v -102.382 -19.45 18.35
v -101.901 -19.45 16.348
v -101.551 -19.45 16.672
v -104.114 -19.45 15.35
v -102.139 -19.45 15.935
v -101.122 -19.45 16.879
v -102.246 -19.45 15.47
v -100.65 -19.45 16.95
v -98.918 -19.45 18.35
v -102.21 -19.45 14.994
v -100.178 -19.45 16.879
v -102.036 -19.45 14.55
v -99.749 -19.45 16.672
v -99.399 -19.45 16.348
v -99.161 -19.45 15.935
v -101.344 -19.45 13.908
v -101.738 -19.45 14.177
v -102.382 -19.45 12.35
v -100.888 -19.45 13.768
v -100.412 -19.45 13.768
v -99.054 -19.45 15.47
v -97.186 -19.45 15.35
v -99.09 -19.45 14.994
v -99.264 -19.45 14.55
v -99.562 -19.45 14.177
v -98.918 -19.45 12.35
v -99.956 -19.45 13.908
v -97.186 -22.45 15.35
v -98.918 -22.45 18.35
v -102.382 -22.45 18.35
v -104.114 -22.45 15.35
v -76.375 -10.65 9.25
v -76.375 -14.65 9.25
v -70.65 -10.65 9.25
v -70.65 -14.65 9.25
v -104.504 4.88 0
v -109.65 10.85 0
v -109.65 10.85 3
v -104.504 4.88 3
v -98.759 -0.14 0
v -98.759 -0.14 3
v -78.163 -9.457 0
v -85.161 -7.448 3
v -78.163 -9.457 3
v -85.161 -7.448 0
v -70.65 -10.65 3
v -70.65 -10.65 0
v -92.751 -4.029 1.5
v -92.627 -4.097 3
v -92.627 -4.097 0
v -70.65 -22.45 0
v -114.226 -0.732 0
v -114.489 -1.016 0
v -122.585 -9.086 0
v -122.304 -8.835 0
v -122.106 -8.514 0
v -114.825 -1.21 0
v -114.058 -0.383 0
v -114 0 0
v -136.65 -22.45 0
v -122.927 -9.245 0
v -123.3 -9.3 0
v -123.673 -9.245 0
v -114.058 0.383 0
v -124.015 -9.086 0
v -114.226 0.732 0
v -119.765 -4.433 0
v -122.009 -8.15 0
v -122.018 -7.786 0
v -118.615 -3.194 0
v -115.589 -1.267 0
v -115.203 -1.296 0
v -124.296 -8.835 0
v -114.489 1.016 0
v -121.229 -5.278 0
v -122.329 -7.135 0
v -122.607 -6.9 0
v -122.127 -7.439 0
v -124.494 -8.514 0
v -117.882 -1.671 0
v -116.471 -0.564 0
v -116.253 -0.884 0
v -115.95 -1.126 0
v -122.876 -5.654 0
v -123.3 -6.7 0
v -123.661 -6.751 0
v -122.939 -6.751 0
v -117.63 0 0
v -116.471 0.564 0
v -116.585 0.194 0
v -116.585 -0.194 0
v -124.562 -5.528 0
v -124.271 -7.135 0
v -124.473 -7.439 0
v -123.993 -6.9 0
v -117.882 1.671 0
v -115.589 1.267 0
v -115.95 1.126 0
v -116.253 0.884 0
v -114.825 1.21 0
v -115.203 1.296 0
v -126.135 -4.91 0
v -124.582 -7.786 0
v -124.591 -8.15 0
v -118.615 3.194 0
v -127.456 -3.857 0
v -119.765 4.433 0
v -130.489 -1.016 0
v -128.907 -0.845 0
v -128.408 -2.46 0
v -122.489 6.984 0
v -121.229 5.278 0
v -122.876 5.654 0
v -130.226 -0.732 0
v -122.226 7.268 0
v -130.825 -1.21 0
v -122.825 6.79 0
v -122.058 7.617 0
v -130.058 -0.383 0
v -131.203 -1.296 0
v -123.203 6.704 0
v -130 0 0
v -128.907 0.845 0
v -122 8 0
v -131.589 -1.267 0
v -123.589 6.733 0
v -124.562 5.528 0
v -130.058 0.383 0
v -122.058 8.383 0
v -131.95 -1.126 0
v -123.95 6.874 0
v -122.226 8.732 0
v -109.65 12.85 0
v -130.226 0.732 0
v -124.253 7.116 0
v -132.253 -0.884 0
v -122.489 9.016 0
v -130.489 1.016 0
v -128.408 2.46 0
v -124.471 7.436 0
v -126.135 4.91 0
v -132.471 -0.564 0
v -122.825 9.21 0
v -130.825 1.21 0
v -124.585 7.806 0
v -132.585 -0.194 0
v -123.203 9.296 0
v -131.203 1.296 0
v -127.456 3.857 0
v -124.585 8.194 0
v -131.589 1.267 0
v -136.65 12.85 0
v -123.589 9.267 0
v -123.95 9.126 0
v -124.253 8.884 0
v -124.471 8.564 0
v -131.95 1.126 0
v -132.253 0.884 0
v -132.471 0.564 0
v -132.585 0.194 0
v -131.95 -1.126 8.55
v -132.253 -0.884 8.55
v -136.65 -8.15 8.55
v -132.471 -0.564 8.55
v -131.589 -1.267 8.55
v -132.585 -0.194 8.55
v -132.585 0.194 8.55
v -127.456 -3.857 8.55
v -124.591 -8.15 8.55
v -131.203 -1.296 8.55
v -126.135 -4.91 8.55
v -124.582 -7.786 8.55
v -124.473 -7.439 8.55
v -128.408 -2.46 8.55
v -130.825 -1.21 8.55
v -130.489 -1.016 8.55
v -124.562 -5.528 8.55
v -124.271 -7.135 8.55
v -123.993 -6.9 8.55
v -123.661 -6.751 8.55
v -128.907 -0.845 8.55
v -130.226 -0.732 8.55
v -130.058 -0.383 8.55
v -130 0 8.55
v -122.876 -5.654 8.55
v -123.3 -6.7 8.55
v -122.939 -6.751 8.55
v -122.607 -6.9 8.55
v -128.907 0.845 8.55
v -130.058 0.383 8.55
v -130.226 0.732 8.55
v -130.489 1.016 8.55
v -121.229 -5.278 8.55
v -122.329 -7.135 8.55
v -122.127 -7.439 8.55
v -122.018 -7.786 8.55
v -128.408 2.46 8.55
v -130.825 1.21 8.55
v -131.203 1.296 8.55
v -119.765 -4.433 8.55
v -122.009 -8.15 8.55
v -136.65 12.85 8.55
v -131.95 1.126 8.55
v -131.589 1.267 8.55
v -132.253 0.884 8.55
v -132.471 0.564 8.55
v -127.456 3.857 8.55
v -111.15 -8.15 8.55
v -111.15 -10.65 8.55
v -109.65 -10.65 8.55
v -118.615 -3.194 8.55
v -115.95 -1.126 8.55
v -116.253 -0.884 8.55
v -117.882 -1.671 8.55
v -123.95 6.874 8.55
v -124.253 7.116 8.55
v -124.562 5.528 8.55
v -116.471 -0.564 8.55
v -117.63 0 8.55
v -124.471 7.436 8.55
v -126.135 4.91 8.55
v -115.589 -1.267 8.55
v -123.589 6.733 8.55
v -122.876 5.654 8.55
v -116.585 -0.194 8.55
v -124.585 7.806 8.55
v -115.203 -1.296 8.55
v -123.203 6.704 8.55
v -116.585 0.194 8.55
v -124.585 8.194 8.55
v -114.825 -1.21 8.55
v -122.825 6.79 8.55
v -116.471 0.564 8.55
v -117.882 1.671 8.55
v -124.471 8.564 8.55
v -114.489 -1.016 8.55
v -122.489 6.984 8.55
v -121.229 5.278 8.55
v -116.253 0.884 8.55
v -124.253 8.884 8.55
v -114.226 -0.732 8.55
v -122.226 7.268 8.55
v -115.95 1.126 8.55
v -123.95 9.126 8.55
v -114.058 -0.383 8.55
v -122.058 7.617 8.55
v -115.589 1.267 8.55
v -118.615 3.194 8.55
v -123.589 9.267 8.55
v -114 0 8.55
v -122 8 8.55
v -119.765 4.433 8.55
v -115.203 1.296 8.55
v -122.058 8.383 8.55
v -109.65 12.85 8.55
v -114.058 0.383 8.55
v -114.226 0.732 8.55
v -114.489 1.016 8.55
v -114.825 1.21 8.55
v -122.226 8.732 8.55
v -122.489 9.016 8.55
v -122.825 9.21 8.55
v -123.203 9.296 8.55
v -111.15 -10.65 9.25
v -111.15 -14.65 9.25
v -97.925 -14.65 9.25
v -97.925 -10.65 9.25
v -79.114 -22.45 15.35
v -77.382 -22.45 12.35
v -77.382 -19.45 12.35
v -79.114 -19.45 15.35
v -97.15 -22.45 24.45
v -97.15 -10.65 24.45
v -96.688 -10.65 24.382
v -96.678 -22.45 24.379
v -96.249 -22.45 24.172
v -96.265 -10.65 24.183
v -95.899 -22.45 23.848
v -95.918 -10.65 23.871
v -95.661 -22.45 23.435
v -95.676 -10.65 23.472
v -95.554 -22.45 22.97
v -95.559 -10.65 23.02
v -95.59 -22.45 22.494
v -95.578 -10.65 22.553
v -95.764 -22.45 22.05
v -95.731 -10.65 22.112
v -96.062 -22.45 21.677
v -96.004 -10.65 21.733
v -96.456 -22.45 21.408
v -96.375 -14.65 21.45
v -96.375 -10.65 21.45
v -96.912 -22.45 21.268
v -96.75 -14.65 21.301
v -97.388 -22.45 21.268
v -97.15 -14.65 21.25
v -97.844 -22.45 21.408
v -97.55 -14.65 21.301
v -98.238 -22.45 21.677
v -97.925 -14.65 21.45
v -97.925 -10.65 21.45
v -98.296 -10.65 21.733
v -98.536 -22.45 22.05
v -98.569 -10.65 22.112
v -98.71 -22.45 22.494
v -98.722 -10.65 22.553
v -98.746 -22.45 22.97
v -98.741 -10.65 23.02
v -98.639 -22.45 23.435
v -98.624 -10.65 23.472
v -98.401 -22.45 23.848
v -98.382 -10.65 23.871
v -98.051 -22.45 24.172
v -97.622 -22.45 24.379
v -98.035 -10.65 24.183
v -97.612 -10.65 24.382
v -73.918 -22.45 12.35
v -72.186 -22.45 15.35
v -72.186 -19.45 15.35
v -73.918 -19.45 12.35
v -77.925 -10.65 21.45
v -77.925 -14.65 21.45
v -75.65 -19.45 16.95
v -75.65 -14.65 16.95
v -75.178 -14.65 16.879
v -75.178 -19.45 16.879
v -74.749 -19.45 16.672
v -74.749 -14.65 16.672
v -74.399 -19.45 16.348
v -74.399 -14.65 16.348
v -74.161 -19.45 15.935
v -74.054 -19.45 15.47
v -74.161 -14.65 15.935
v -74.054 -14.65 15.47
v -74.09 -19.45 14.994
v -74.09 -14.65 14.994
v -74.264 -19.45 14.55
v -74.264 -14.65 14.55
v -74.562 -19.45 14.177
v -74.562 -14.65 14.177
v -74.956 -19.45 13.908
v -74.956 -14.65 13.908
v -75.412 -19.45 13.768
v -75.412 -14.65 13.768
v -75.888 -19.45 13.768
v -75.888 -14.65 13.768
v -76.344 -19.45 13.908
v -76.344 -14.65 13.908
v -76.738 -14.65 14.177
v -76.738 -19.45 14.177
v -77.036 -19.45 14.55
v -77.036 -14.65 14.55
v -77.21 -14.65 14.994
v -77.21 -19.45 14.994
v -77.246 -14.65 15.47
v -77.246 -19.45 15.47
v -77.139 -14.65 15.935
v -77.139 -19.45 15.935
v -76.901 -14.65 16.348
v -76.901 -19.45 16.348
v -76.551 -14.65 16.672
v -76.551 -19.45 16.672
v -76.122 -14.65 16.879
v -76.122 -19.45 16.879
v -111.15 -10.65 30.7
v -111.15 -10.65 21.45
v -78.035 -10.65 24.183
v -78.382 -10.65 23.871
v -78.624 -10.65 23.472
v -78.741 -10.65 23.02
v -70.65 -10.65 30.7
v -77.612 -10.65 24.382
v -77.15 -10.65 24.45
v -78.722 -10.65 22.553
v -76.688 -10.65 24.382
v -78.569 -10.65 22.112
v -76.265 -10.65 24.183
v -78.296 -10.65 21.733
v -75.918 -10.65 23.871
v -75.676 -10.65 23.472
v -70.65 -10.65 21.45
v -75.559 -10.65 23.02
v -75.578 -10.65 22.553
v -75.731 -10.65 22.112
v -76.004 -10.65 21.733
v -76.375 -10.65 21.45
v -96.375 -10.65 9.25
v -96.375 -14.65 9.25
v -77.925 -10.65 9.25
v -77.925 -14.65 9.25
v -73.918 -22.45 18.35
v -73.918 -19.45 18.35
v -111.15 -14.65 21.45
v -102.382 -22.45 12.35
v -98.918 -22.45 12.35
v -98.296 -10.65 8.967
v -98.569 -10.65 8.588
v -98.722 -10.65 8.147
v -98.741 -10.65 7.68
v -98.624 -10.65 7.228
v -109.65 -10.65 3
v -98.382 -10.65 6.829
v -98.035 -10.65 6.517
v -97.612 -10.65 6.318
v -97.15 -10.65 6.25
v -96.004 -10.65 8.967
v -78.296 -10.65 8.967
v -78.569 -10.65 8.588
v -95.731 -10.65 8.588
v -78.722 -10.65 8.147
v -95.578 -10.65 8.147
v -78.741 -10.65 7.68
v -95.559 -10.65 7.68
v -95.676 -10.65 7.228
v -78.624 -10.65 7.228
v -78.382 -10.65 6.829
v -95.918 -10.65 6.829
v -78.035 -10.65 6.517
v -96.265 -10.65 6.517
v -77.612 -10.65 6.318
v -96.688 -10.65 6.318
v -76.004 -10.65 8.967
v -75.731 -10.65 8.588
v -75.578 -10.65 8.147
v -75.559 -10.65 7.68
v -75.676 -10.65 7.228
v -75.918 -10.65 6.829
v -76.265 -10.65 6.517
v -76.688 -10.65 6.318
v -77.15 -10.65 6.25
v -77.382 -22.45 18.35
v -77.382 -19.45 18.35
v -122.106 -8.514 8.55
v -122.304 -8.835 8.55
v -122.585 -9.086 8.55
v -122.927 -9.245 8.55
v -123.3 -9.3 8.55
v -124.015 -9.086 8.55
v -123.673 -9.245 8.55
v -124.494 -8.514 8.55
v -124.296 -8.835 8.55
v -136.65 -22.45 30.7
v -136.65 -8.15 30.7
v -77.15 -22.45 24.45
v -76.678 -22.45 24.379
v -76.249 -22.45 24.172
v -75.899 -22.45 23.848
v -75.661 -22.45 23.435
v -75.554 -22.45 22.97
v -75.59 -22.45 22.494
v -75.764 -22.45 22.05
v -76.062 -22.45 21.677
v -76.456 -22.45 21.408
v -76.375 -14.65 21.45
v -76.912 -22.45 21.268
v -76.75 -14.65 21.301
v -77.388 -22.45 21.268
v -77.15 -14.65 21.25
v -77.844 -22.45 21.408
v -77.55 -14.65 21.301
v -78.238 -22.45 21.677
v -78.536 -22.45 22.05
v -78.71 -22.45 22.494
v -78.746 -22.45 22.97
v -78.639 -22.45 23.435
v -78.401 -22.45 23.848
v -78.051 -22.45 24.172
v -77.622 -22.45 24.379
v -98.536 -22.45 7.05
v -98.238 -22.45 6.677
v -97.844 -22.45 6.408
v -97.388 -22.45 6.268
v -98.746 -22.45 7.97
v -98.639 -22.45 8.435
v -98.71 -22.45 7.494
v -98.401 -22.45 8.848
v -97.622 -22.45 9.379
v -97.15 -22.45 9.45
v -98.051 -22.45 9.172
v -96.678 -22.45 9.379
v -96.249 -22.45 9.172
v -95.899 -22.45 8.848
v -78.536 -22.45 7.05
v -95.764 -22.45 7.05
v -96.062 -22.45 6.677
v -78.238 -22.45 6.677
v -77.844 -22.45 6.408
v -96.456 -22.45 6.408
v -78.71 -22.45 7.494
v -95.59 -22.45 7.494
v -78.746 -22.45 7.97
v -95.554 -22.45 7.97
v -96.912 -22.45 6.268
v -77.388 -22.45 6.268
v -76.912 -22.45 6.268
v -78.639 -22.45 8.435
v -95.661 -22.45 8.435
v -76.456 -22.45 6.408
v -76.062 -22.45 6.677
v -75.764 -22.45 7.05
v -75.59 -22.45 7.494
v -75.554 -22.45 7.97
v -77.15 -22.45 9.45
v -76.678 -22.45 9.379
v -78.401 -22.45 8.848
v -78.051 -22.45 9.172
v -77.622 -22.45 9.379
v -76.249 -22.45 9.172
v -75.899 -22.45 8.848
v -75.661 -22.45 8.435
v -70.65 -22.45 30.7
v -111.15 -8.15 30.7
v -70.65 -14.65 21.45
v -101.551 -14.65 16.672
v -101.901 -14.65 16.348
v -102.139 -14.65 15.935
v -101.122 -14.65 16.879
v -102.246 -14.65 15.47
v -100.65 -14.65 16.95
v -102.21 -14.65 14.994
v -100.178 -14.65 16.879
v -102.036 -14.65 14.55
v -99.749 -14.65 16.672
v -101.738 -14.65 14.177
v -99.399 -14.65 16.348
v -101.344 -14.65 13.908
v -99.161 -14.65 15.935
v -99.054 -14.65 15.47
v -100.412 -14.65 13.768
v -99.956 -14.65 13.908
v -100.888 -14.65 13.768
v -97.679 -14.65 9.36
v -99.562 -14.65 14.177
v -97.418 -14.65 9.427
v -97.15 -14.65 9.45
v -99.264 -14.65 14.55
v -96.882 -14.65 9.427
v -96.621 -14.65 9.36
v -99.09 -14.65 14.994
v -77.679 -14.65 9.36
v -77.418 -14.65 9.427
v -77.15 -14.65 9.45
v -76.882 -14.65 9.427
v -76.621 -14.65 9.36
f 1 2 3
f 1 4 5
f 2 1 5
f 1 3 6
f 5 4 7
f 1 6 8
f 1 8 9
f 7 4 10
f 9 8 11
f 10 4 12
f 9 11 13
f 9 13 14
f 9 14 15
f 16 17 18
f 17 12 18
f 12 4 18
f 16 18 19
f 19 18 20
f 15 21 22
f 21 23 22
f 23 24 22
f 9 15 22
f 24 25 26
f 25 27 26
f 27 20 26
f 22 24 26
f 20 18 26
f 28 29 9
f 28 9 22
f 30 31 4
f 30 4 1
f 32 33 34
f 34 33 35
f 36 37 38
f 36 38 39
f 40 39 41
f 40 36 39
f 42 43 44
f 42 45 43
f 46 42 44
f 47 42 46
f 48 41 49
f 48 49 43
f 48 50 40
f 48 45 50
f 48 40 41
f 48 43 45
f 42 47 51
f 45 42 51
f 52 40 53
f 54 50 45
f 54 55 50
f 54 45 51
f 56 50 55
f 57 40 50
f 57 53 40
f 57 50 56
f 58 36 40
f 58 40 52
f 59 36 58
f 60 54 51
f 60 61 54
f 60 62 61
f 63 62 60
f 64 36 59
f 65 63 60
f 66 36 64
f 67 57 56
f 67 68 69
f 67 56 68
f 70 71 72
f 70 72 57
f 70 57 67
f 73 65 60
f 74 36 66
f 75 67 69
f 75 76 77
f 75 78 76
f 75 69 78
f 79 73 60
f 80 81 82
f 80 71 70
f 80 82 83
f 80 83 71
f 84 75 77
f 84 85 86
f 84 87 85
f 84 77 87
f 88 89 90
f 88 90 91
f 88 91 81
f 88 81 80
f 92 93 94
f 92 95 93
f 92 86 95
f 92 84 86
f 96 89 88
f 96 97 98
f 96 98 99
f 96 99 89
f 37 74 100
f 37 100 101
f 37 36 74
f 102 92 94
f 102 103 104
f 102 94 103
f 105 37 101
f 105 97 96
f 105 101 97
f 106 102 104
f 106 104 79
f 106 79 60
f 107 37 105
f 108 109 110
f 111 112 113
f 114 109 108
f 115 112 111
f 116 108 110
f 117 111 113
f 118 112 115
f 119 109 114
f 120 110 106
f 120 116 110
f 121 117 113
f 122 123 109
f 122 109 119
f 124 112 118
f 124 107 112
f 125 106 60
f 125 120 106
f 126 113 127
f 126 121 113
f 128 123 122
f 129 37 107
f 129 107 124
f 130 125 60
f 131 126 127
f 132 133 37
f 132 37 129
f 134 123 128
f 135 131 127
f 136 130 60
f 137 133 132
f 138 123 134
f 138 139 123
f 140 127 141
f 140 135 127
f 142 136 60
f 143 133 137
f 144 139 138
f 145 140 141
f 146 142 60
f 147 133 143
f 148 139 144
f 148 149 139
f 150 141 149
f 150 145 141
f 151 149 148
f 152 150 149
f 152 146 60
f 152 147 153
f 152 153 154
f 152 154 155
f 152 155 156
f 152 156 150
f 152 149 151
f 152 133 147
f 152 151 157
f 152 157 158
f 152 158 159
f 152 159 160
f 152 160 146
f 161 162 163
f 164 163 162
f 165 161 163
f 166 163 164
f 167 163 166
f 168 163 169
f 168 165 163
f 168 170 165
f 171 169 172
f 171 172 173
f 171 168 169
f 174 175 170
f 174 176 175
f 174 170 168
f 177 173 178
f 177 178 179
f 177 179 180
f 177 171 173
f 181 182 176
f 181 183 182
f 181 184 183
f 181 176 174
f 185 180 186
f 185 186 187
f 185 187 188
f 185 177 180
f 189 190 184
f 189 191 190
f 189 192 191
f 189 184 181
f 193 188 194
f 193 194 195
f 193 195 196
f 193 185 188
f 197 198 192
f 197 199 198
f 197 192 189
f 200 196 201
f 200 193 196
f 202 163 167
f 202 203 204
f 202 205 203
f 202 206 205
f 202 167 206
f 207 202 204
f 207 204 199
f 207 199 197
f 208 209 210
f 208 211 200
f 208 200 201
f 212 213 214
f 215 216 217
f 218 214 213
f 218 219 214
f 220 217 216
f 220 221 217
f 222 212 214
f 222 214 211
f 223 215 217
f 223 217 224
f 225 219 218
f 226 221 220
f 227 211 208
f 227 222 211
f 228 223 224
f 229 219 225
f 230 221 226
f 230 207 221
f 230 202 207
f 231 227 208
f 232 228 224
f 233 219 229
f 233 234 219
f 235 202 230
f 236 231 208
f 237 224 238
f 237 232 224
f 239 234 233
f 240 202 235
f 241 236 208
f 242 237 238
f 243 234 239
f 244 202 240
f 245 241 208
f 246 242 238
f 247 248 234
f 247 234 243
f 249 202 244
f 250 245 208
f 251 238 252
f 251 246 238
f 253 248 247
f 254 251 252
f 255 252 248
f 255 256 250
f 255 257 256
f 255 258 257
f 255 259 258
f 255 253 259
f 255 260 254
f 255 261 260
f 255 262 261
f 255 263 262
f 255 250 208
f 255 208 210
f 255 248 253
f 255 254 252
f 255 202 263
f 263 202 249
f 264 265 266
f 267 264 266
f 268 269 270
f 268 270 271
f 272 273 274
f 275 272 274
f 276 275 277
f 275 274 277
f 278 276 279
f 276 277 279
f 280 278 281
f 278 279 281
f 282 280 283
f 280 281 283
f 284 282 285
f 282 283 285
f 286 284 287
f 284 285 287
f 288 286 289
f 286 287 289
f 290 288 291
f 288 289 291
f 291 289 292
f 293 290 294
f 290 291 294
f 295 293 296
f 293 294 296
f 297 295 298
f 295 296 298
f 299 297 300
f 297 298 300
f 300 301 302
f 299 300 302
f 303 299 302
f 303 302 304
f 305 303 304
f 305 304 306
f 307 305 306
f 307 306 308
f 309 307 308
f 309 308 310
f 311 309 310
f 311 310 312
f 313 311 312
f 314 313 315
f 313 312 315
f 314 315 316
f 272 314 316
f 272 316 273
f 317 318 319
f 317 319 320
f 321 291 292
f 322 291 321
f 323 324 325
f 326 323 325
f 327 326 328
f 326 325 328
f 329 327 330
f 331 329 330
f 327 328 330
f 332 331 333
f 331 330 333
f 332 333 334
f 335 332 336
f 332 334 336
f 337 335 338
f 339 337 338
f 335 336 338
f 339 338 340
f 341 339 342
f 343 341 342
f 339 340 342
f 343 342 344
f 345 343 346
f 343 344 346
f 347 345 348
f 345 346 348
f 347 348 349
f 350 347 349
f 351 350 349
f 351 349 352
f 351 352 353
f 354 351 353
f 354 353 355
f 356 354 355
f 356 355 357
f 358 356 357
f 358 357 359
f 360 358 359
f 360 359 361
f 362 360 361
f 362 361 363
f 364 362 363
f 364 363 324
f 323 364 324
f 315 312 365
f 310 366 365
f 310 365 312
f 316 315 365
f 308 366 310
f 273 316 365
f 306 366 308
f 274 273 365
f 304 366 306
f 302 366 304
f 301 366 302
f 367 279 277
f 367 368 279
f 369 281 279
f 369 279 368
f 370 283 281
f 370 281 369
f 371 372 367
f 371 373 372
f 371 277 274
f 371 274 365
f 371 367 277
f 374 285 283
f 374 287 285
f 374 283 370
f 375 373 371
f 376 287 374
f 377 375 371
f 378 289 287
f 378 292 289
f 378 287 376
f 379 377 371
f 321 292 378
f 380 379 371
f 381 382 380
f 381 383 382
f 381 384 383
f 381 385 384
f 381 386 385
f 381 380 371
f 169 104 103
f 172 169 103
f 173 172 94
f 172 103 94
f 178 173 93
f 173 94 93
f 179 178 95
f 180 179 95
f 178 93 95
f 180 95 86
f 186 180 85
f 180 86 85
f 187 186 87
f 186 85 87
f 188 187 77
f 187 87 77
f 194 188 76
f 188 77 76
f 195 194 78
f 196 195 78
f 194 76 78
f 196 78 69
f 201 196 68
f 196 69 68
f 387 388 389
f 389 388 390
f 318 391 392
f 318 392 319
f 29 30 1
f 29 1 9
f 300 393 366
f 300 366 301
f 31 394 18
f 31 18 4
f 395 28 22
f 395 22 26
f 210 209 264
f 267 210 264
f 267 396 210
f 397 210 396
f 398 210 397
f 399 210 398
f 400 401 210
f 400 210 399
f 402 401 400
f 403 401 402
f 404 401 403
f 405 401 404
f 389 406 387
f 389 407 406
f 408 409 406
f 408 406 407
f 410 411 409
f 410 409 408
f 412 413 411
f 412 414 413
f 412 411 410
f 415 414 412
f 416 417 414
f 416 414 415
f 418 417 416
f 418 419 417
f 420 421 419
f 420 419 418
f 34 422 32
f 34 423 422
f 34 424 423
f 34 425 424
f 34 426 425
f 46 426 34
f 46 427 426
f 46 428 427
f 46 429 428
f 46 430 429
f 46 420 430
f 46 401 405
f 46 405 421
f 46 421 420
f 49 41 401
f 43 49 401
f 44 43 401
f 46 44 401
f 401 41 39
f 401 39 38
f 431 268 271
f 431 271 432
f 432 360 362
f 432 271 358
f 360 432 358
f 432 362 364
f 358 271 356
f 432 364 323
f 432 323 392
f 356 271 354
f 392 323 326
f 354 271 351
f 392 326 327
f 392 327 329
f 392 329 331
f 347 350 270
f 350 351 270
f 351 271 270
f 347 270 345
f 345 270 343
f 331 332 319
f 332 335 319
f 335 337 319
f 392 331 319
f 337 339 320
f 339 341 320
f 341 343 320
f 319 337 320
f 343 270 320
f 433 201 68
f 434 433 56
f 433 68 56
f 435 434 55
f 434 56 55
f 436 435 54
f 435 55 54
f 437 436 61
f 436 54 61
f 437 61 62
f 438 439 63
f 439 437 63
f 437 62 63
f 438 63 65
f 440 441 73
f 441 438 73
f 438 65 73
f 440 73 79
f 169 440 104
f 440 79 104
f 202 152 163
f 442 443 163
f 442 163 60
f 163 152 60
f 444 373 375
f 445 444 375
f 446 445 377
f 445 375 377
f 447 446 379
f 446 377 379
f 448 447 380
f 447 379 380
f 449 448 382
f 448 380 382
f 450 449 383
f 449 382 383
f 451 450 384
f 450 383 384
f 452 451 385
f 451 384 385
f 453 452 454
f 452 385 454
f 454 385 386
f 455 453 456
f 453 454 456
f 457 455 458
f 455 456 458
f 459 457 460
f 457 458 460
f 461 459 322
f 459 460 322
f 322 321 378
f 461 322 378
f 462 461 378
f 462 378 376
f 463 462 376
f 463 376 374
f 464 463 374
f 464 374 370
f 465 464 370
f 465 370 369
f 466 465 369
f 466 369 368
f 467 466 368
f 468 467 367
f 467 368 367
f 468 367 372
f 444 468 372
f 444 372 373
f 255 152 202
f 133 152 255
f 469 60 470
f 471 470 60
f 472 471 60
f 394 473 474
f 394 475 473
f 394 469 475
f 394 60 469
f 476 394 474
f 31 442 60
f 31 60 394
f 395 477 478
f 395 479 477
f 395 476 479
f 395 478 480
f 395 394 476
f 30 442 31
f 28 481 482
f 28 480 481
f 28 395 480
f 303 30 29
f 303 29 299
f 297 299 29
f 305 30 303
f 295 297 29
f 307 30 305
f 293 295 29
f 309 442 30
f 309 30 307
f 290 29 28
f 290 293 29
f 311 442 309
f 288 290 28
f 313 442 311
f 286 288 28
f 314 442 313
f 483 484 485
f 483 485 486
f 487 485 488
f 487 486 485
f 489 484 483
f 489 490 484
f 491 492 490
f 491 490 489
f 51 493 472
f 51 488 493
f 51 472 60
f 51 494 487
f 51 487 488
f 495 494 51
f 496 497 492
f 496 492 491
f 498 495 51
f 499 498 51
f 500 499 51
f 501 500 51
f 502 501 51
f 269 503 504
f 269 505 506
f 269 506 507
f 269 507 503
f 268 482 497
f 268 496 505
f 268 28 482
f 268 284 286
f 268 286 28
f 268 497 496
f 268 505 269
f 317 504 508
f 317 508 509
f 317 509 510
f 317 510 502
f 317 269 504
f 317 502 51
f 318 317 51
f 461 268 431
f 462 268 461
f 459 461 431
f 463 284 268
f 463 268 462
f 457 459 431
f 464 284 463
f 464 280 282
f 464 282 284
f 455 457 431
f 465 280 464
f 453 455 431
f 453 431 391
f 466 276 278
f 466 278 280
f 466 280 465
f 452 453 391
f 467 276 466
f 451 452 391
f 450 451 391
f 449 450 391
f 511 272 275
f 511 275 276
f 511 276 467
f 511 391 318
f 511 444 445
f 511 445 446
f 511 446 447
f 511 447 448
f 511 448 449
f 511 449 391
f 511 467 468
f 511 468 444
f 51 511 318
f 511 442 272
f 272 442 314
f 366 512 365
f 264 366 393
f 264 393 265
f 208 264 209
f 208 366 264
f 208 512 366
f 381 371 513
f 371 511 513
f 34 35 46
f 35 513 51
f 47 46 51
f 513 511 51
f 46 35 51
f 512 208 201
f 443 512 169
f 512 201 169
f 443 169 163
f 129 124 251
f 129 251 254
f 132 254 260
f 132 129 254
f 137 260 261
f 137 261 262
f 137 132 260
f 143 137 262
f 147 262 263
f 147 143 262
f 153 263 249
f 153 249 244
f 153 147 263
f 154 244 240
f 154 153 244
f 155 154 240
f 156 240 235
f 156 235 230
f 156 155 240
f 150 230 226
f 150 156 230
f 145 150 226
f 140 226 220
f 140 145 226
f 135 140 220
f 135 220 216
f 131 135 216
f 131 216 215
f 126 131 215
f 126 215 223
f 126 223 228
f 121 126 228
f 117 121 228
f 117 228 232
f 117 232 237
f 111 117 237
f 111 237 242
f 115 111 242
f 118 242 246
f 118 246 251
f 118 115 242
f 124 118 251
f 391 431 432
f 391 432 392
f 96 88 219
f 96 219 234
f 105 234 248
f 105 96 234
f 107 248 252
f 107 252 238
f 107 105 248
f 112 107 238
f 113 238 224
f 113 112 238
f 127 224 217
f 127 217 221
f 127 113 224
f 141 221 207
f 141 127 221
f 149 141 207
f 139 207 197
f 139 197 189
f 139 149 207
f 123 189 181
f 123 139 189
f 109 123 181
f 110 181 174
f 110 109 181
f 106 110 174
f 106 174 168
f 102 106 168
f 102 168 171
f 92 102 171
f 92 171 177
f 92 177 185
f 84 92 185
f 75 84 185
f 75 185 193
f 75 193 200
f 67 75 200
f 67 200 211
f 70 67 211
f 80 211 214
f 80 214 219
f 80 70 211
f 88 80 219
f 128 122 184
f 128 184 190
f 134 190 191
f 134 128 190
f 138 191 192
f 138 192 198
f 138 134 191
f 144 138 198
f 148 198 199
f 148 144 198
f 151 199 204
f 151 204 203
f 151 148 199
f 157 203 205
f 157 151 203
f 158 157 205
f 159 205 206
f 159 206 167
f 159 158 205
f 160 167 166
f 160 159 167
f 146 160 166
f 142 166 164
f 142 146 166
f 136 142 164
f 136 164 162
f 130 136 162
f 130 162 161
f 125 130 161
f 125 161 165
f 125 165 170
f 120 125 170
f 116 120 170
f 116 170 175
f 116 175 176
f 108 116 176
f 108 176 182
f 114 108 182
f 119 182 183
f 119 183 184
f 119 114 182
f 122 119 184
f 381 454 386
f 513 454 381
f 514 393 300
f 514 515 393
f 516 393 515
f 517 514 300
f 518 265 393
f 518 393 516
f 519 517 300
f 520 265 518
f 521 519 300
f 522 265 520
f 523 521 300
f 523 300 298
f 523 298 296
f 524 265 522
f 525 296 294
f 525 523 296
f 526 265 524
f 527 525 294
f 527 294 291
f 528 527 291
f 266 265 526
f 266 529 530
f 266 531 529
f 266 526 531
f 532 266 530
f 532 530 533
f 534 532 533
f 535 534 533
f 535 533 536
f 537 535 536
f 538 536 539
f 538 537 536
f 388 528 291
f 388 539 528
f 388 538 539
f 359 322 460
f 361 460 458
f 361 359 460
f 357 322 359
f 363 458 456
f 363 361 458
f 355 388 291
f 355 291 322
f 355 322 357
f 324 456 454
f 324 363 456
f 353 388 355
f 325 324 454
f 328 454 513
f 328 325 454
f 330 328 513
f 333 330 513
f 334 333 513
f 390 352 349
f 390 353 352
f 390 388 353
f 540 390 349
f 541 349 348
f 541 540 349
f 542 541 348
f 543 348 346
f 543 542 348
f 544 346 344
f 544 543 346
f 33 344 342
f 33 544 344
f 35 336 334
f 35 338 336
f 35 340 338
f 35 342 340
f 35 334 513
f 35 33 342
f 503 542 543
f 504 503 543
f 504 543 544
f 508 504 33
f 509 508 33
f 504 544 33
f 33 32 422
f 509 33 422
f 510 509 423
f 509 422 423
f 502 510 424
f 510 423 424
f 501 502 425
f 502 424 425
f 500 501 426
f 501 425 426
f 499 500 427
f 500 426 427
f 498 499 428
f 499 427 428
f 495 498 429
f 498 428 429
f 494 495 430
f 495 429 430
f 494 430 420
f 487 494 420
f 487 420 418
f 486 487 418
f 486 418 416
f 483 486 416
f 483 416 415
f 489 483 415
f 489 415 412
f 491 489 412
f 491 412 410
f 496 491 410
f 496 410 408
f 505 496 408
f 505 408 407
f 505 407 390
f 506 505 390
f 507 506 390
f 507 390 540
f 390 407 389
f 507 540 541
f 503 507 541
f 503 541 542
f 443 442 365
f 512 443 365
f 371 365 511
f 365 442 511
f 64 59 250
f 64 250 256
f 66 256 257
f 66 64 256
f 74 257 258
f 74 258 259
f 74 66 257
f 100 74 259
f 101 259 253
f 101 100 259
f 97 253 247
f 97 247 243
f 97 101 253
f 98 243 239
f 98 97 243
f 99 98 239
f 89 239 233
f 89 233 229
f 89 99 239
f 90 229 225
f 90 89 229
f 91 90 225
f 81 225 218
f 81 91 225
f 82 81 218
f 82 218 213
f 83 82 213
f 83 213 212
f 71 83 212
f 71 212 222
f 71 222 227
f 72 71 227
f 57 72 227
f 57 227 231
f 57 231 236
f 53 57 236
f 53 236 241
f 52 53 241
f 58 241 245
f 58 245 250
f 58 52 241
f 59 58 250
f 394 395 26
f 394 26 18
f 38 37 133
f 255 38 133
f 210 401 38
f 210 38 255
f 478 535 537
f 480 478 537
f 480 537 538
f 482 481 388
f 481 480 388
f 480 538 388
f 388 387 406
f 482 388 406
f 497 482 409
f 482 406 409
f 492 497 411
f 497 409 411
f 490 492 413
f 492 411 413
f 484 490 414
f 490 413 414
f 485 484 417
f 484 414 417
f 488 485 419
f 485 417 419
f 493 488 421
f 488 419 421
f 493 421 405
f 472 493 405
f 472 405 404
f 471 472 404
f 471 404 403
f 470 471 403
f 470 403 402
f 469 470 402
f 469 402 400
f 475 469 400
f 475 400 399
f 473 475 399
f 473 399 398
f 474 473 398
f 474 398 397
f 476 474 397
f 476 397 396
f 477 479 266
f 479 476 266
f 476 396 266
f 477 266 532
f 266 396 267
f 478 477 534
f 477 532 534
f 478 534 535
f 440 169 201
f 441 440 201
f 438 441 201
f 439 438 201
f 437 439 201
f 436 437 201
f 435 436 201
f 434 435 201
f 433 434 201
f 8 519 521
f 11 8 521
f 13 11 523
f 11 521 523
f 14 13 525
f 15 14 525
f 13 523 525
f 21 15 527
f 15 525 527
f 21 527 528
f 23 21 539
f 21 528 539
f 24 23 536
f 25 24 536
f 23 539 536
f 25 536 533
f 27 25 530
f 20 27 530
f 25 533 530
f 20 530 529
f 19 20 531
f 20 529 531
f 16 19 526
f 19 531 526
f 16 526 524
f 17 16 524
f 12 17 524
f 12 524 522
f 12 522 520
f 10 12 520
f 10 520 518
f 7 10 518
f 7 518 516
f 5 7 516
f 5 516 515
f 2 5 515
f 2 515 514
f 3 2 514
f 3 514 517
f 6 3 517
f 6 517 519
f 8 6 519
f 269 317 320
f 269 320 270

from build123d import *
from build123d.topology import SkipClean

# Parameters (mm, degrees)
CROQUIS2_R                         = 10.875
CROQUIS2_R_2                       = 5.67
CROQUIS2_R_3                       = 1.6
CROQUIS2_R_4                       = 1.3
SALIENTE_EXTRUIR1_DEPTH            = 30.7
CROQUIS4_W                         = 27
CROQUIS4_H                         = 26
CORTAR_EXTRUIR2_DEPTH              = 22.7
CROQUIS3_W                         = 12.3
CROQUIS3_H                         = 8
CORTAR_EXTRUIR5_DEPTH              = 45
CORTAR_EXTRUIR7_START              = -24.5
CROQUIS7_W                         = 48
CROQUIS7_H                         = 9.85
CORTAR_EXTRUIR7_DEPTH              = 24.5
CORTAR_EXTRUIR10_DEPTH             = 77.154202117
CORTAR_EXTRUIR10_DEPTH_BACK        = 77.154202117
CROQUIS11_R                        = 1.6
CROQUIS18_W                        = 48
CROQUIS18_H                        = 9.85
CORTAR_EXTRUIR12_DEPTH             = 8
CROQUIS19_W                        = 12.3
CROQUIS19_H                        = 8
CORTAR_EXTRUIR13_DEPTH             = 3
CROQUIS20_R                        = 1.3
CROQUIS20_R_2                      = 5.67
SALIENTE_EXTRUIR2_DEPTH            = 0.55
SALIENTE_EXTRUIR4_START            = -22.15
SALIENTE_EXTRUIR4_DEPTH            = 22.15
S_LIDO_MOVER_COPIAR1_START         = 8.55
S_LIDO_MOVER_COPIAR1_DEPTH         = 22.15
S_LIDO_MOVER_COPIAR1_2_DEPTH       = 22.15
S_LIDO_MOVER_COPIAR1_3_DEPTH       = 30.7
S_LIDO_MOVER_COPIAR1_4_OUTLINE_R   = 1.3
S_LIDO_MOVER_COPIAR1_4_OUTLINE_R_2 = 5.67
S_LIDO_MOVER_COPIAR1_4_DEPTH       = 8.55
S_LIDO_MOVER_COPIAR1_START_2       = -34.15
S_LIDO_MOVER_COPIAR1_5_OUTLINE_R   = 1.6
S_LIDO_MOVER_COPIAR1_5_OUTLINE_W   = 75
S_LIDO_MOVER_COPIAR1_5_OUTLINE_H   = 30.7
S_LIDO_MOVER_COPIAR1_5_DEPTH       = 52
CROQUIS23_R                        = 1.6
CORTAR_EXTRUIR17_DEPTH             = 144.777475635
CORTAR_EXTRUIR18_DEPTH             = 3
CORTAR_EXTRUIR18_DEPTH_BACK        = 144.777475635
CORTAR_EXTRUIR18_START             = -7.8
CROQUIS24_W                        = 75
CROQUIS24_H                        = 30.7
CORTAR_EXTRUIR19_DEPTH             = 11.7
CROQUIS28_W                        = 27
CROQUIS28_H                        = 8.55
CORTAR_EXTRUIR21_DEPTH             = 5
CORTAR_EXTRUIR22_START             = -8
CORTAR_EXTRUIR22_DEPTH             = 8
CROQUIS30_W                        = 1.5
CROQUIS30_H                        = 22.15
CORTAR_EXTRUIR23_DEPTH             = 6.5
CROQUIS31_W                        = 30.7
CROQUIS31_H                        = 7.8
CORTAR_EXTRUIR24_DEPTH             = 9
CROQUIS32_W                        = 40.5
CROQUIS32_H                        = 9.25
CROQUIS32_W_2                      = 39
SALIENTE_EXTRUIR5_DEPTH            = 4
CROQUIS33_W                        = 1.5
CROQUIS33_H                        = 0.7
SALIENTE_EXTRUIR6_DEPTH            = 4
CROQUIS34_R                        = 1.6
CORTAR_EXTRUIR25_DEPTH             = 143.013951779
SALIENTE_EXTRUIR7_DEPTH            = 3


with BuildPart() as part:
    # Croquis2 → Saliente-Extruir1 (new body)
    # profile 1 of 6: a face of its own
    with BuildSketch(Plane.XY):
        Polygon((-61.65, 17.85), (-61.65, -34.15), (-50.65, -34.15), (-50.65, -32.65), (-50.65, -22.65), (-50.65, -22.45), (-49.65, -22.45), (-22.65, -22.45), (-21.65, -22.45), (-21.65, -22.65), (-21.65, -32.65), (-21.65, -34.15), (13.35, -34.15), (13.35, 17.85), align=None)
        Circle(CROQUIS2_R, mode=Mode.SUBTRACT)
    # profile 2 of 6: a face of its own
    with BuildSketch(Plane.XY):
        Circle(CROQUIS2_R)
        with Locations(Location((0, 0, 0), (0, 0, 90))):
            Circle(CROQUIS2_R_2, mode=Mode.SUBTRACT)
        with Locations((0, -8)):
            Circle(CROQUIS2_R_3, mode=Mode.SUBTRACT)
        with Locations((-8, 0)):
            Circle(CROQUIS2_R_3, mode=Mode.SUBTRACT)
        with Locations((8, 0)):
            Circle(CROQUIS2_R_3, mode=Mode.SUBTRACT)
        with Locations((0, 8)):
            Circle(CROQUIS2_R_3, mode=Mode.SUBTRACT)
    # profile 3 of 6: a face of its own
    with BuildSketch(Plane.XY):
        with Locations((0, 8)):
            Circle(CROQUIS2_R_3)
        with Locations(Location((0, 8, 0), (0, 0, 90))):
            Circle(CROQUIS2_R_4, mode=Mode.SUBTRACT)
    # profile 4 of 6: a face of its own
    with BuildSketch(Plane.XY):
        with Locations((8, 0)):
            Circle(CROQUIS2_R_3)
        with Locations(Location((8, 0, 0), (0, 0, 90))):
            Circle(CROQUIS2_R_4, mode=Mode.SUBTRACT)
    # profile 5 of 6: a face of its own
    with BuildSketch(Plane.XY):
        with Locations((0, -8)):
            Circle(CROQUIS2_R_3)
        with Locations(Location((0, -8, 0), (0, 0, 90))):
            Circle(CROQUIS2_R_4, mode=Mode.SUBTRACT)
    # profile 6 of 6: a face of its own
    with BuildSketch(Plane.XY):
        with Locations((-8, 0)):
            Circle(CROQUIS2_R_3)
        with Locations(Location((-8, 0, 0), (0, 0, 90))):
            Circle(CROQUIS2_R_4, mode=Mode.SUBTRACT)
    extrude(amount=SALIENTE_EXTRUIR1_DEPTH)

    # Croquis4 → Cortar-Extruir2 (cut)
    with BuildSketch(Plane.XY.offset(30.7)):
        with Locations((-0.15, 4.85)):
            Rectangle(CROQUIS4_W, CROQUIS4_H)
    extrude(amount=-CORTAR_EXTRUIR2_DEPTH, mode=Mode.SUBTRACT)

    # Croquis3 → Cortar-Extruir5 (cut)
    with BuildSketch(Plane.ZY.offset(61.65)):
        with Locations((14.7, -10.65)):
            Rectangle(CROQUIS3_W, CROQUIS3_H)
    extrude(amount=-CORTAR_EXTRUIR5_DEPTH, mode=Mode.SUBTRACT)

    # Croquis7 → Cortar-Extruir7 (cut)
    with BuildSketch(Plane(origin=(0, 17.85, 0), x_dir=(1, 0, 0), z_dir=(0, 1, 0)).offset(CORTAR_EXTRUIR7_START)):
        with Locations((-37.65, -25.775)):
            Rectangle(CROQUIS7_W, CROQUIS7_H)
        Polygon((-61.65, -8.55), (-61.65, -20.85), (-13.65, -20.85), (-13.65, 0), (-61.65, 0), align=None)
    extrude(amount=CORTAR_EXTRUIR7_DEPTH, mode=Mode.SUBTRACT)

    # Croquis11 → Cortar-Extruir10 (cut, two sides: drawn at the far end of the back side and taken through both)
    with BuildSketch(Plane(origin=(0, -14.65, 0), x_dir=(1, 0, 0), z_dir=(0, 1, 0)).offset(-CORTAR_EXTRUIR10_DEPTH_BACK)):
        with BuildLine():
            Line((-44.711250543, -8.55), (-47.588749457, -8.55))
            ThreePointArc((-47.588749457, -8.55), (-46.15, -9.45), (-44.711250543, -8.55))
        make_face()
        with BuildLine():
            ThreePointArc((-44.55, -7.85), (-46.509166305, -6.290833695), (-47.588749457, -8.55))
            Line((-47.588749457, -8.55), (-44.711250543, -8.55))
            ThreePointArc((-44.711250543, -8.55), (-44.590833695, -8.209166305), (-44.55, -7.85))
        make_face()
        with BuildLine():
            Line((-24.711250543, -8.55), (-27.588749457, -8.55))
            ThreePointArc((-27.588749457, -8.55), (-26.15, -9.45), (-24.711250543, -8.55))
        make_face()
        with BuildLine():
            ThreePointArc((-24.55, -7.85), (-26.509166305, -6.290833695), (-27.588749457, -8.55))
            Line((-27.588749457, -8.55), (-24.711250543, -8.55))
            ThreePointArc((-24.711250543, -8.55), (-24.590833695, -8.209166305), (-24.55, -7.85))
        make_face()
        with Locations(Location((-26.15, -22.849986467, 0), (0, 0, 270))):
            Circle(CROQUIS11_R)
        with Locations(Location((-46.15, -22.849986467, 0), (0, 0, 270))):
            Circle(CROQUIS11_R)
    extrude(amount=CORTAR_EXTRUIR10_DEPTH + CORTAR_EXTRUIR10_DEPTH_BACK, mode=Mode.SUBTRACT)

    # Croquis18 → Cortar-Extruir12 (cut)
    with BuildSketch(Plane(origin=(0, -6.65, 0), x_dir=(1, 0, 0), z_dir=(0, 1, 0))):
        with Locations((-37.65, -25.775)):
            Rectangle(CROQUIS18_W, CROQUIS18_H)
    extrude(amount=-CORTAR_EXTRUIR12_DEPTH, mode=Mode.SUBTRACT)

    # Croquis19 → Cortar-Extruir13 (cut)
    with BuildSketch(Plane.ZY.offset(16.65)):
        with Locations((14.7, -10.65)):
            Rectangle(CROQUIS19_W, CROQUIS19_H)
    extrude(amount=-CORTAR_EXTRUIR13_DEPTH, mode=Mode.SUBTRACT)

    # Croquis20 → Saliente-Extruir2 (add)
    with SkipClean():  # the faces are left unmerged after this step: merging them gives an invalid solid
        with BuildSketch(Plane.XY.offset(8)):
            with BuildLine():
                ThreePointArc((-1.291317157, -8.15), (0, -6.7), (1.291317157, -8.15))
                Line((1.291317157, -8.15), (13.35, -8.15))
                Line((13.35, -8.15), (13.35, 17.85))
                Line((13.35, 17.85), (-13.65, 17.85))
                Line((-13.65, 17.85), (-13.65, -6.65))
                Line((-13.65, -6.65), (-13.65, -8.15))
                Line((-13.65, -8.15), (-1.291317157, -8.15))
            make_face()
            with Locations(Location((8, 0, 0), (0, 0, 90))):
                Circle(CROQUIS20_R, mode=Mode.SUBTRACT)
            with Locations(Location((0, 0, 0), (0, 0, 90))):
                Circle(CROQUIS20_R_2, mode=Mode.SUBTRACT)
            with Locations(Location((0, 8, 0), (0, 0, 90))):
                Circle(CROQUIS20_R, mode=Mode.SUBTRACT)
            with Locations(Location((-8, 0, 0), (0, 0, 90))):
                Circle(CROQUIS20_R, mode=Mode.SUBTRACT)
        extrude(amount=SALIENTE_EXTRUIR2_DEPTH)

    # Croquis22 → Saliente-Extruir4 (add)
    with BuildSketch(Plane.XY.offset(30.7).offset(SALIENTE_EXTRUIR4_START)):
        with BuildLine():
            Line((-1.291317157, -8.15), (1.291317157, -8.15))
            ThreePointArc((1.291317157, -8.15), (0, -9.3), (-1.291317157, -8.15))
        make_face()
    extrude(amount=SALIENTE_EXTRUIR4_DEPTH)

    # Sólido-Mover/Copiar1: read off the stored shape, not the designer's step
    # Sólido-Mover/Copiar1 outline → Sólido-Mover/Copiar1 (cut)
    with BuildSketch(Plane.XY.offset(S_LIDO_MOVER_COPIAR1_START)):
        with BuildLine():
            Line((1.291317157, -8.15), (-1.291317157, -8.15))
            ThreePointArc((-1.291317157, -8.15), (0, -9.3), (1.291317157, -8.15))
        make_face()
    extrude(amount=S_LIDO_MOVER_COPIAR1_DEPTH, mode=Mode.SUBTRACT)



with BuildPart() as body_2:
    # S_lido-Mover_Copiar1 2 outline → S_lido-Mover_Copiar1 2 (new body)
    with BuildSketch(Plane.XY.offset(S_LIDO_MOVER_COPIAR1_START)):
        with BuildLine():
            Line((-122.008682843, -8.15), (-124.591317157, -8.15))
            ThreePointArc((-124.591317157, -8.15), (-123.3, -9.3), (-122.008682843, -8.15))
        make_face()
    extrude(amount=S_LIDO_MOVER_COPIAR1_2_DEPTH)


with BuildPart() as part_1:
    add(part.part)

    add(body_2.part)  # S_lido-Mover_Copiar1 3 merges body 2
    # S_lido-Mover_Copiar1 3 outline → S_lido-Mover_Copiar1 3 (add)
    with BuildSketch(Plane.XY):
        with BuildLine():
            Line((-124.591317157, -8.15), (-136.65, -8.15))
            Line((-136.65, -8.15), (-136.65, -34.15))
            Line((-136.65, -34.15), (-101.65, -34.15))
            Line((-101.65, -34.15), (-101.65, -22.45))
            Line((-101.65, -22.45), (-72.65, -22.45))
            Line((-72.65, -22.45), (-72.65, -34.15))
            Line((-72.65, -34.15), (-50.65, -34.15))
            Line((-50.65, -34.15), (-50.65, -22.45))
            Line((-50.65, -22.45), (-21.65, -22.45))
            Line((-21.65, -22.45), (-21.65, -34.15))
            Line((-21.65, -34.15), (13.35, -34.15))
            Line((13.35, -34.15), (13.35, -8.15))
            Line((13.35, -8.15), (1.291317157, -8.15))
            ThreePointArc((1.291317157, -8.15), (0, -9.3), (-1.291317157, -8.15))
            Line((-1.291317157, -8.15), (-13.65, -8.15))
            Line((-13.65, -8.15), (-13.65, -14.65))
            Line((-13.65, -14.65), (-109.65, -14.65))
            Line((-109.65, -14.65), (-109.65, -8.15))
            Line((-109.65, -8.15), (-122.008682843, -8.15))
            ThreePointArc((-122.008682843, -8.15), (-123.3, -9.3), (-124.591317157, -8.15))
        make_face()
    extrude(amount=S_LIDO_MOVER_COPIAR1_3_DEPTH)

    # S_lido-Mover_Copiar1 4 outline → S_lido-Mover_Copiar1 4 (add)
    with BuildSketch(Plane.XY):
        with BuildLine():
            Line((-136.65, 17.85), (-136.65, -8.15))
            Line((-136.65, -8.15), (-124.591317157, -8.15))
            ThreePointArc((-124.591317157, -8.15), (-123.3, -6.7), (-122.008682843, -8.15))
            Line((-122.008682843, -8.15), (-109.65, -8.15))
            Line((-109.65, -8.15), (-109.65, -14.65))
            Line((-109.65, -14.65), (-13.65, -14.65))
            Line((-13.65, -14.65), (-13.65, -8.15))
            Line((-13.65, -8.15), (-1.291317157, -8.15))
            ThreePointArc((-1.291317157, -8.15), (0, -6.7), (1.291317157, -8.15))
            Line((1.291317157, -8.15), (13.35, -8.15))
            Line((13.35, -8.15), (13.35, 17.85))
            Line((13.35, 17.85), (-13.65, 17.85))
            Line((-13.65, 17.85), (-13.65, -6.65))
            Line((-13.65, -6.65), (-109.65, -6.65))
            Line((-109.65, -6.65), (-109.65, 17.85))
            Line((-109.65, 17.85), (-136.65, 17.85))
        make_face()
        with Locations((-131.3, 0)):
            Circle(S_LIDO_MOVER_COPIAR1_4_OUTLINE_R, mode=Mode.SUBTRACT)
        with Locations((-123.3, 0)):
            Circle(S_LIDO_MOVER_COPIAR1_4_OUTLINE_R_2, mode=Mode.SUBTRACT)
        with Locations((-115.3, 0)):
            Circle(S_LIDO_MOVER_COPIAR1_4_OUTLINE_R, mode=Mode.SUBTRACT)
        with Locations((-123.3, 8)):
            Circle(S_LIDO_MOVER_COPIAR1_4_OUTLINE_R, mode=Mode.SUBTRACT)
        with Locations((-8, 0)):
            Circle(S_LIDO_MOVER_COPIAR1_4_OUTLINE_R, mode=Mode.SUBTRACT)
        Circle(S_LIDO_MOVER_COPIAR1_4_OUTLINE_R_2, mode=Mode.SUBTRACT)
        with Locations((8, 0)):
            Circle(S_LIDO_MOVER_COPIAR1_4_OUTLINE_R, mode=Mode.SUBTRACT)
        with Locations((0, 8)):
            Circle(S_LIDO_MOVER_COPIAR1_4_OUTLINE_R, mode=Mode.SUBTRACT)
    extrude(amount=S_LIDO_MOVER_COPIAR1_4_DEPTH)

    # S_lido-Mover_Copiar1 5 outline → S_lido-Mover_Copiar1 5 (cut)
    with BuildSketch(Plane(origin=(0, 0, 0), x_dir=(1, 0, 0), z_dir=(0, 1, 0)).offset(S_LIDO_MOVER_COPIAR1_START_2)):
        with Locations((-97.15, -7.85)):
            Circle(S_LIDO_MOVER_COPIAR1_5_OUTLINE_R)
        with Locations((-77.15, -7.85)):
            Circle(S_LIDO_MOVER_COPIAR1_5_OUTLINE_R)
        with Locations((-24.15, -15.35)):
            Rectangle(S_LIDO_MOVER_COPIAR1_5_OUTLINE_W, S_LIDO_MOVER_COPIAR1_5_OUTLINE_H)
        with Locations((-97.15, -22.849986467)):
            Circle(S_LIDO_MOVER_COPIAR1_5_OUTLINE_R)
        with Locations((-77.15, -22.849986467)):
            Circle(S_LIDO_MOVER_COPIAR1_5_OUTLINE_R)
    extrude(amount=S_LIDO_MOVER_COPIAR1_5_DEPTH, mode=Mode.SUBTRACT)

    # Croquis23 → Cortar-Extruir17 (cut, through all)
    with BuildSketch(Plane(origin=(0, -14.65, 0), x_dir=(1, 0, 0), z_dir=(0, 1, 0))):
        with Locations(Location((-100.65, -15.35, 0), (0, 0, 270))):
            Circle(CROQUIS23_R)
        with Locations(Location((-75.65, -15.35, 0), (0, 0, 270))):
            Circle(CROQUIS23_R)
    extrude(amount=-CORTAR_EXTRUIR17_DEPTH, mode=Mode.SUBTRACT)

    # Croquis23<3> → Cortar-Extruir18 (cut, two sides: drawn at the far end of the back side and taken through both)
    with BuildSketch(Plane(origin=(0, -14.65, 0), x_dir=(1, 0, 0), z_dir=(0, 1, 0)).offset(CORTAR_EXTRUIR18_START - CORTAR_EXTRUIR18_DEPTH_BACK)):
        Polygon((-73.917949192, -12.35), (-77.382050808, -12.35), (-79.114101615, -15.35), (-77.382050808, -18.35), (-73.917949192, -18.35), (-72.185898385, -15.35), align=None)
        Polygon((-98.917949192, -12.35), (-102.382050808, -12.35), (-104.114101615, -15.35), (-102.382050808, -18.35), (-98.917949192, -18.35), (-97.185898385, -15.35), align=None)
    extrude(amount=CORTAR_EXTRUIR18_DEPTH + CORTAR_EXTRUIR18_DEPTH_BACK, mode=Mode.SUBTRACT)

    # Croquis24 → Cortar-Extruir19 (cut)
    with BuildSketch(Plane.XZ.offset(34.15)):
        with Locations((-99.15, 15.35)):
            Rectangle(CROQUIS24_W, CROQUIS24_H)
    extrude(amount=-CORTAR_EXTRUIR19_DEPTH, mode=Mode.SUBTRACT)

    # Croquis28 → Cortar-Extruir21 (cut)
    with BuildSketch(Plane(origin=(0, 17.85, 0), x_dir=(1, 0, 0), z_dir=(0, 1, 0))):
        with Locations((-123.15, -4.275)):
            Rectangle(CROQUIS28_W, CROQUIS28_H)
    extrude(amount=-CORTAR_EXTRUIR21_DEPTH, mode=Mode.SUBTRACT)

    # Croquis29 → Cortar-Extruir22 (cut)
    with BuildSketch(Plane(origin=(0, -6.65, 0), x_dir=(1, 0, 0), z_dir=(0, 1, 0)).offset(CORTAR_EXTRUIR22_START)):
        with BuildLine():
            Line((-109.65, -8.55), (-98.588749457, -8.55))
            ThreePointArc((-98.588749457, -8.55), (-97.15, -6.25), (-95.711250543, -8.55))
            Line((-95.711250543, -8.55), (-78.588749457, -8.55))
            ThreePointArc((-78.588749457, -8.55), (-77.15, -6.25), (-75.711250543, -8.55))
            Line((-75.711250543, -8.55), (-61.65, -8.55))
            Line((-61.65, -8.55), (-61.65, 0))
            Line((-61.65, 0), (-109.65, 0))
            Line((-109.65, 0), (-109.65, -8.55))
        make_face()
    extrude(amount=CORTAR_EXTRUIR22_DEPTH, mode=Mode.SUBTRACT)

    # Croquis30 → Cortar-Extruir23 (cut)
    with BuildSketch(Plane(origin=(0, -8.15, 0), x_dir=(1, 0, 0), z_dir=(0, 1, 0))):
        with Locations((-110.4, -19.625)):
            Rectangle(CROQUIS30_W, CROQUIS30_H)
    extrude(amount=-CORTAR_EXTRUIR23_DEPTH, mode=Mode.SUBTRACT)

    # Croquis31 → Cortar-Extruir24 (cut)
    with BuildSketch(Plane(origin=(-61.65, 0, 0), x_dir=(0, 0, -1), z_dir=(1, 0, 0))):
        with Locations((-15.35, -18.55)):
            Rectangle(CROQUIS31_W, CROQUIS31_H)
    extrude(amount=-CORTAR_EXTRUIR24_DEPTH, mode=Mode.SUBTRACT)

    # Croquis32 → Saliente-Extruir5 (add)
    with BuildSketch(Plane(origin=(0, -14.65, 0), x_dir=(1, 0, 0), z_dir=(0, 1, 0))):
        with Locations((-90.9, -26.075)):
            Rectangle(CROQUIS32_W, CROQUIS32_H)
        with Locations((-90.15, -4.625)):
            Rectangle(CROQUIS32_W_2, CROQUIS32_H)
    extrude(amount=SALIENTE_EXTRUIR5_DEPTH)

    # Croquis33 → Saliente-Extruir6 (add)
    with BuildSketch(Plane(origin=(0, -14.65, 0), x_dir=(1, 0, 0), z_dir=(0, 1, 0))):
        with Locations((-110.4, -8.9)):
            Rectangle(CROQUIS33_W, CROQUIS33_H)
    extrude(amount=SALIENTE_EXTRUIR6_DEPTH)

    # Croquis34 → Cortar-Extruir25 (cut, through all)
    with BuildSketch(Plane(origin=(0, -10.65, 0), x_dir=(1, 0, 0), z_dir=(0, 1, 0))):
        with Locations(Location((-97.15, -22.849986467, 0), (0, 0, 270))):
            Circle(CROQUIS34_R)
        with Locations(Location((-77.15, -22.849986467, 0), (0, 0, 270))):
            Circle(CROQUIS34_R)
        with Locations(Location((-77.15, -7.85, 0), (0, 0, 270))):
            Circle(CROQUIS34_R)
        with Locations(Location((-97.15, -7.85, 0), (0, 0, 270))):
            Circle(CROQUIS34_R)
    extrude(amount=-CORTAR_EXTRUIR25_DEPTH, mode=Mode.SUBTRACT)

    # Croquis36 → Saliente-Extruir7 (add)
    with BuildSketch(Plane(origin=(0, 0, 0), x_dir=(-1, 0, 0), z_dir=(0, 0, -1))):
        with BuildLine():
            Line((70.65, -10.65), (109.65, -10.65))
            Line((109.65, -10.65), (109.65, 10.85))
            add(Edge.make_bspline(
                [(109.65, 10.85), (95.352699805, -8.157116541), (70.65, -10.65)],
                knots=[0, 0, 0, 1, 1, 1], degree=2))
        make_face()
    extrude(amount=-SALIENTE_EXTRUIR7_DEPTH)


solid = part_1.part
